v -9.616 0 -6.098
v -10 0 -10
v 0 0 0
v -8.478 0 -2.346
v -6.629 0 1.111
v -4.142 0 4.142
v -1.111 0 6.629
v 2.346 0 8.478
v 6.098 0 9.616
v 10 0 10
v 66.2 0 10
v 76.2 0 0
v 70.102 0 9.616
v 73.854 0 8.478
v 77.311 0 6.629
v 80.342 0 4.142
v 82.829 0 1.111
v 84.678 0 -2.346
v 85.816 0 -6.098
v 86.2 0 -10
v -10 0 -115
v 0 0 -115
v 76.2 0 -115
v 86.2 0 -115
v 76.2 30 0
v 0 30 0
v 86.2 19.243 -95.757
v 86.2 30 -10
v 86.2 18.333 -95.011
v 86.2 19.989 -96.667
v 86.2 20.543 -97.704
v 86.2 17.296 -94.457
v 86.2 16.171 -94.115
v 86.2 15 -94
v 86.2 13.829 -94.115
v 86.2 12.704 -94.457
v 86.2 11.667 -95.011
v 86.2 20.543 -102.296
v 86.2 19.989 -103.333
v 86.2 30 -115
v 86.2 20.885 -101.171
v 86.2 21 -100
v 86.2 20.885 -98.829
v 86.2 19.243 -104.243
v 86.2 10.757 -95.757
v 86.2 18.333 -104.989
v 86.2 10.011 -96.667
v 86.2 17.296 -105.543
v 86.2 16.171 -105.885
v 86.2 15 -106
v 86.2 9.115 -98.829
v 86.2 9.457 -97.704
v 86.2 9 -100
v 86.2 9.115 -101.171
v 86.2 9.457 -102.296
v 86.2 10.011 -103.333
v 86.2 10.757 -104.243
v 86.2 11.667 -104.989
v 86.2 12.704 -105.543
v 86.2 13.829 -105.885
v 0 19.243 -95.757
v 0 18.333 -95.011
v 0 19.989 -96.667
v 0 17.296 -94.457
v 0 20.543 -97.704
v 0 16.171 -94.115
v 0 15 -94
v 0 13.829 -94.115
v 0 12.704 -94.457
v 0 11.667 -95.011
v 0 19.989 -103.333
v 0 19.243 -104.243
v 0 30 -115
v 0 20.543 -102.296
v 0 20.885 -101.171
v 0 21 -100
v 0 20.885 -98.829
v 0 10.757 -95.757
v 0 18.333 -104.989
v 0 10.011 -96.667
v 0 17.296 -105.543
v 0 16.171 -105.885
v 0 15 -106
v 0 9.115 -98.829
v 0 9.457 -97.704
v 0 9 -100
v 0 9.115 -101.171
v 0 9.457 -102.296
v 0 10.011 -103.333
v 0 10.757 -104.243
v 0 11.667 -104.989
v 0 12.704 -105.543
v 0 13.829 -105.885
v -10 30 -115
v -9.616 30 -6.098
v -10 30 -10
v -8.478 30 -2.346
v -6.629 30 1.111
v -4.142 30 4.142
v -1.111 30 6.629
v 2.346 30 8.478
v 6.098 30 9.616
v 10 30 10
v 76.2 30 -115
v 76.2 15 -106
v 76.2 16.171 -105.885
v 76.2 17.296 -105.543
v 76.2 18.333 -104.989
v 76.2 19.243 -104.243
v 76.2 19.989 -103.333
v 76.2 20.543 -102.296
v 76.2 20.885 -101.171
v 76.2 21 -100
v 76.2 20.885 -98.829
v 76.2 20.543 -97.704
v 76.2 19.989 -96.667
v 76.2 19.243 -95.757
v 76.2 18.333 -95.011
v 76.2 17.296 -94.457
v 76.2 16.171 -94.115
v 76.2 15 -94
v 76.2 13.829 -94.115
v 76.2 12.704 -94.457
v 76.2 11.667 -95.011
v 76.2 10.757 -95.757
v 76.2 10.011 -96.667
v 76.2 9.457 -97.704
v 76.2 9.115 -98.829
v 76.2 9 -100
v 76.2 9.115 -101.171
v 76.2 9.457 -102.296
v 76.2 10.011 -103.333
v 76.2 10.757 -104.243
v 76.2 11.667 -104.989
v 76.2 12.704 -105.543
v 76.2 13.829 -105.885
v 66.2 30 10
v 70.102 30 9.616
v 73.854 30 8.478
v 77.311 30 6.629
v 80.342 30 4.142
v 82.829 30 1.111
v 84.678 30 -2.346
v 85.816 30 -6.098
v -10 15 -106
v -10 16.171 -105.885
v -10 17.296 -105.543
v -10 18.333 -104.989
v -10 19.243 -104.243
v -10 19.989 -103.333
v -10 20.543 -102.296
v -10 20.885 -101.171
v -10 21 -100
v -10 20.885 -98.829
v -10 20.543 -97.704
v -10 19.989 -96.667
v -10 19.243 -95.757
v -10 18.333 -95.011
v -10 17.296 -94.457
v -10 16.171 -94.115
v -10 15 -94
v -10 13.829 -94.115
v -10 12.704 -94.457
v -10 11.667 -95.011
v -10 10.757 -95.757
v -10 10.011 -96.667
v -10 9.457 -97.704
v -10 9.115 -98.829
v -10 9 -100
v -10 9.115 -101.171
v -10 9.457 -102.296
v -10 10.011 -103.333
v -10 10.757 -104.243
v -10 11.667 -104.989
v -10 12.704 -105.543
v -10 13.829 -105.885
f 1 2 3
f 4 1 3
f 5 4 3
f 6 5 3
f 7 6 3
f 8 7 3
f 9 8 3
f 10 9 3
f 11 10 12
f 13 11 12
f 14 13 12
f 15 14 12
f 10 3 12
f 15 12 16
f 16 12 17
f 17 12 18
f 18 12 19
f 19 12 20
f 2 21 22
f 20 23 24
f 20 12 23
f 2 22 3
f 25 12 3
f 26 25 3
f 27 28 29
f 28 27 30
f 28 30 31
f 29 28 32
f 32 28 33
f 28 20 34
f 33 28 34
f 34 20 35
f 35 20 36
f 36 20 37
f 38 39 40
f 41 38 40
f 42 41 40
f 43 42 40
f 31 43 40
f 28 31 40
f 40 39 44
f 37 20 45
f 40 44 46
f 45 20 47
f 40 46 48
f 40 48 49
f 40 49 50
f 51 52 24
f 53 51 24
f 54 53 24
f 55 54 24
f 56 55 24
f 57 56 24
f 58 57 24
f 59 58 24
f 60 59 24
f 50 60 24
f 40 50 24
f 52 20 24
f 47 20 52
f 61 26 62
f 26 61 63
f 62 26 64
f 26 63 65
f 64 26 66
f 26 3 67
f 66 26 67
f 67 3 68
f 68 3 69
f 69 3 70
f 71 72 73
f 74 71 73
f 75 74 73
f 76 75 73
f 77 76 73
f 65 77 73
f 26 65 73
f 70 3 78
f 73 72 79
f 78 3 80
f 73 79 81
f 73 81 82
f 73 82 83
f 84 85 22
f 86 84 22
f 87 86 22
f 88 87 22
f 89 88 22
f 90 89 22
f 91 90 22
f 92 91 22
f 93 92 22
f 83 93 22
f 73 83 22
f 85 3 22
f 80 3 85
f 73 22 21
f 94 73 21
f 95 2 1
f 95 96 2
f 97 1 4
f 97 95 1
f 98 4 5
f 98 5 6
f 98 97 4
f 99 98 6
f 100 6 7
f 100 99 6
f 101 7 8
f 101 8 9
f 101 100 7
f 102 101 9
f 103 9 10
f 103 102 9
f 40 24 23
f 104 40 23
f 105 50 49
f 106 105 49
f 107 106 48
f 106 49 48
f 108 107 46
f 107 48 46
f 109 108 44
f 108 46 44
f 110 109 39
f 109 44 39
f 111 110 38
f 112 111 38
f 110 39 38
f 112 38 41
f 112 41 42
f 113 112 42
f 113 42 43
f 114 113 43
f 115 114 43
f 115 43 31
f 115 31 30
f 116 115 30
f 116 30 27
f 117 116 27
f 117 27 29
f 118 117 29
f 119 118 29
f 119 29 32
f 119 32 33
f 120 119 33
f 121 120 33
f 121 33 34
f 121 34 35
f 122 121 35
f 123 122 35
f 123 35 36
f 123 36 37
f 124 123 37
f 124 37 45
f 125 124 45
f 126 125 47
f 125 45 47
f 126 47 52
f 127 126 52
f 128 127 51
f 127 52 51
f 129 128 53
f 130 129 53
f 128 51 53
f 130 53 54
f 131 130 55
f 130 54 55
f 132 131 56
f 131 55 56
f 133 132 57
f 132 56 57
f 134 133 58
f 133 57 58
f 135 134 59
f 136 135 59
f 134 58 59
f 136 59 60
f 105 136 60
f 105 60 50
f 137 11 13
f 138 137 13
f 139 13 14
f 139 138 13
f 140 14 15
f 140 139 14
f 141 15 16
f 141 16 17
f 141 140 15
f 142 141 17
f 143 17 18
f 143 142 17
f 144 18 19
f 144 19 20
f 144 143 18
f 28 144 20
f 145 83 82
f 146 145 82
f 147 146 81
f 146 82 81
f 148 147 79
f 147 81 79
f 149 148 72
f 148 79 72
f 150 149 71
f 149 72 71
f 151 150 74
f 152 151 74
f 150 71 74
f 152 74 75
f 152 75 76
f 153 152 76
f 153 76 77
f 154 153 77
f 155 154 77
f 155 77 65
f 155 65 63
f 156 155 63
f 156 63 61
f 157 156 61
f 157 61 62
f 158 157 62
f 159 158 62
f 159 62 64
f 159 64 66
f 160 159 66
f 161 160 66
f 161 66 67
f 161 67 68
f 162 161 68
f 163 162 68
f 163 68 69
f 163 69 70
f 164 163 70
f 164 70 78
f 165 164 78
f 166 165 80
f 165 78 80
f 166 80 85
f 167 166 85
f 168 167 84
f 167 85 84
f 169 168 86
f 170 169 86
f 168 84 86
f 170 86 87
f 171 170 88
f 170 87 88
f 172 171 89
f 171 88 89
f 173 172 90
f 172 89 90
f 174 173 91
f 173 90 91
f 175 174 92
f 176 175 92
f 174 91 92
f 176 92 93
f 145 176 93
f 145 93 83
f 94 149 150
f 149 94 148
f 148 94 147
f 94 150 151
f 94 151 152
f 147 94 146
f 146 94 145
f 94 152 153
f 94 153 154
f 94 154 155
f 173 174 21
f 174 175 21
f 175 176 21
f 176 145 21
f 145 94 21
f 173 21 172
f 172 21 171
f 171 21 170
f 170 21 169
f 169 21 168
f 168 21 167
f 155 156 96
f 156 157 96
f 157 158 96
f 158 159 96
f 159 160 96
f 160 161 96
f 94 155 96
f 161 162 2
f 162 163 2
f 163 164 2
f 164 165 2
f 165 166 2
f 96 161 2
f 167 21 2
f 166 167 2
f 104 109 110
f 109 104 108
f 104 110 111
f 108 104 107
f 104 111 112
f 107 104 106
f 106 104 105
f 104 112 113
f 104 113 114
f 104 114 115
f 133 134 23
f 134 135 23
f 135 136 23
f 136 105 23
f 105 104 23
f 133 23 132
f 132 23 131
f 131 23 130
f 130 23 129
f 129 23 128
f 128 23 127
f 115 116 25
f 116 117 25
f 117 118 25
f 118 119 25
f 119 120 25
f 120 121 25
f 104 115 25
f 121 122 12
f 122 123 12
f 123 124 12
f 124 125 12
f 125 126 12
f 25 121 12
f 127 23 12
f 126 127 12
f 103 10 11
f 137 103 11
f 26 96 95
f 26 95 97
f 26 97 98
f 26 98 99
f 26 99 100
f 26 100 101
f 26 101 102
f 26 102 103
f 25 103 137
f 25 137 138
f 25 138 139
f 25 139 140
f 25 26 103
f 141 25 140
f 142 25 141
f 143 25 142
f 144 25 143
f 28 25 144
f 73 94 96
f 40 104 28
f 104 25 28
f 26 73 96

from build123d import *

# Parameters (mm, degrees)
BOSS_EXTRUDE1_DEPTH = 30
FILLET1_R           = 20
SKETCH2_R           = 6
CUT_EXTRUDE1_DEPTH  = 97.2


with BuildPart() as part:
    # Sketch1 → Boss-Extrude1 (new body)
    with BuildSketch(Plane(origin=(0, 0, 0), x_dir=(1, 0, 0), z_dir=(0, 1, 0))):
        Polygon((0, 115), (-10, 115), (-10, -10), (86.2, -10), (86.2, 115), (76.2, 115), (76.2, 0), (0, 0), align=None)
    extrude(amount=BOSS_EXTRUDE1_DEPTH)

    # Fillet1
    fillet1_edges = [part.edges().sort_by_distance(p)[0] for p in [
        (86.2, 15, 10),
        (-10, 15, 10),
    ]]
    fillet(fillet1_edges, radius=FILLET1_R)

    # Sketch2 → Cut-Extrude1 (cut, through all)
    with BuildSketch(Plane(origin=(86.2, 0, 0), x_dir=(0, 0, -1), z_dir=(1, 0, 0))):
        with Locations((100, 15)):
            Circle(SKETCH2_R)
    extrude(amount=-CUT_EXTRUDE1_DEPTH, mode=Mode.SUBTRACT)


solid = part.part
